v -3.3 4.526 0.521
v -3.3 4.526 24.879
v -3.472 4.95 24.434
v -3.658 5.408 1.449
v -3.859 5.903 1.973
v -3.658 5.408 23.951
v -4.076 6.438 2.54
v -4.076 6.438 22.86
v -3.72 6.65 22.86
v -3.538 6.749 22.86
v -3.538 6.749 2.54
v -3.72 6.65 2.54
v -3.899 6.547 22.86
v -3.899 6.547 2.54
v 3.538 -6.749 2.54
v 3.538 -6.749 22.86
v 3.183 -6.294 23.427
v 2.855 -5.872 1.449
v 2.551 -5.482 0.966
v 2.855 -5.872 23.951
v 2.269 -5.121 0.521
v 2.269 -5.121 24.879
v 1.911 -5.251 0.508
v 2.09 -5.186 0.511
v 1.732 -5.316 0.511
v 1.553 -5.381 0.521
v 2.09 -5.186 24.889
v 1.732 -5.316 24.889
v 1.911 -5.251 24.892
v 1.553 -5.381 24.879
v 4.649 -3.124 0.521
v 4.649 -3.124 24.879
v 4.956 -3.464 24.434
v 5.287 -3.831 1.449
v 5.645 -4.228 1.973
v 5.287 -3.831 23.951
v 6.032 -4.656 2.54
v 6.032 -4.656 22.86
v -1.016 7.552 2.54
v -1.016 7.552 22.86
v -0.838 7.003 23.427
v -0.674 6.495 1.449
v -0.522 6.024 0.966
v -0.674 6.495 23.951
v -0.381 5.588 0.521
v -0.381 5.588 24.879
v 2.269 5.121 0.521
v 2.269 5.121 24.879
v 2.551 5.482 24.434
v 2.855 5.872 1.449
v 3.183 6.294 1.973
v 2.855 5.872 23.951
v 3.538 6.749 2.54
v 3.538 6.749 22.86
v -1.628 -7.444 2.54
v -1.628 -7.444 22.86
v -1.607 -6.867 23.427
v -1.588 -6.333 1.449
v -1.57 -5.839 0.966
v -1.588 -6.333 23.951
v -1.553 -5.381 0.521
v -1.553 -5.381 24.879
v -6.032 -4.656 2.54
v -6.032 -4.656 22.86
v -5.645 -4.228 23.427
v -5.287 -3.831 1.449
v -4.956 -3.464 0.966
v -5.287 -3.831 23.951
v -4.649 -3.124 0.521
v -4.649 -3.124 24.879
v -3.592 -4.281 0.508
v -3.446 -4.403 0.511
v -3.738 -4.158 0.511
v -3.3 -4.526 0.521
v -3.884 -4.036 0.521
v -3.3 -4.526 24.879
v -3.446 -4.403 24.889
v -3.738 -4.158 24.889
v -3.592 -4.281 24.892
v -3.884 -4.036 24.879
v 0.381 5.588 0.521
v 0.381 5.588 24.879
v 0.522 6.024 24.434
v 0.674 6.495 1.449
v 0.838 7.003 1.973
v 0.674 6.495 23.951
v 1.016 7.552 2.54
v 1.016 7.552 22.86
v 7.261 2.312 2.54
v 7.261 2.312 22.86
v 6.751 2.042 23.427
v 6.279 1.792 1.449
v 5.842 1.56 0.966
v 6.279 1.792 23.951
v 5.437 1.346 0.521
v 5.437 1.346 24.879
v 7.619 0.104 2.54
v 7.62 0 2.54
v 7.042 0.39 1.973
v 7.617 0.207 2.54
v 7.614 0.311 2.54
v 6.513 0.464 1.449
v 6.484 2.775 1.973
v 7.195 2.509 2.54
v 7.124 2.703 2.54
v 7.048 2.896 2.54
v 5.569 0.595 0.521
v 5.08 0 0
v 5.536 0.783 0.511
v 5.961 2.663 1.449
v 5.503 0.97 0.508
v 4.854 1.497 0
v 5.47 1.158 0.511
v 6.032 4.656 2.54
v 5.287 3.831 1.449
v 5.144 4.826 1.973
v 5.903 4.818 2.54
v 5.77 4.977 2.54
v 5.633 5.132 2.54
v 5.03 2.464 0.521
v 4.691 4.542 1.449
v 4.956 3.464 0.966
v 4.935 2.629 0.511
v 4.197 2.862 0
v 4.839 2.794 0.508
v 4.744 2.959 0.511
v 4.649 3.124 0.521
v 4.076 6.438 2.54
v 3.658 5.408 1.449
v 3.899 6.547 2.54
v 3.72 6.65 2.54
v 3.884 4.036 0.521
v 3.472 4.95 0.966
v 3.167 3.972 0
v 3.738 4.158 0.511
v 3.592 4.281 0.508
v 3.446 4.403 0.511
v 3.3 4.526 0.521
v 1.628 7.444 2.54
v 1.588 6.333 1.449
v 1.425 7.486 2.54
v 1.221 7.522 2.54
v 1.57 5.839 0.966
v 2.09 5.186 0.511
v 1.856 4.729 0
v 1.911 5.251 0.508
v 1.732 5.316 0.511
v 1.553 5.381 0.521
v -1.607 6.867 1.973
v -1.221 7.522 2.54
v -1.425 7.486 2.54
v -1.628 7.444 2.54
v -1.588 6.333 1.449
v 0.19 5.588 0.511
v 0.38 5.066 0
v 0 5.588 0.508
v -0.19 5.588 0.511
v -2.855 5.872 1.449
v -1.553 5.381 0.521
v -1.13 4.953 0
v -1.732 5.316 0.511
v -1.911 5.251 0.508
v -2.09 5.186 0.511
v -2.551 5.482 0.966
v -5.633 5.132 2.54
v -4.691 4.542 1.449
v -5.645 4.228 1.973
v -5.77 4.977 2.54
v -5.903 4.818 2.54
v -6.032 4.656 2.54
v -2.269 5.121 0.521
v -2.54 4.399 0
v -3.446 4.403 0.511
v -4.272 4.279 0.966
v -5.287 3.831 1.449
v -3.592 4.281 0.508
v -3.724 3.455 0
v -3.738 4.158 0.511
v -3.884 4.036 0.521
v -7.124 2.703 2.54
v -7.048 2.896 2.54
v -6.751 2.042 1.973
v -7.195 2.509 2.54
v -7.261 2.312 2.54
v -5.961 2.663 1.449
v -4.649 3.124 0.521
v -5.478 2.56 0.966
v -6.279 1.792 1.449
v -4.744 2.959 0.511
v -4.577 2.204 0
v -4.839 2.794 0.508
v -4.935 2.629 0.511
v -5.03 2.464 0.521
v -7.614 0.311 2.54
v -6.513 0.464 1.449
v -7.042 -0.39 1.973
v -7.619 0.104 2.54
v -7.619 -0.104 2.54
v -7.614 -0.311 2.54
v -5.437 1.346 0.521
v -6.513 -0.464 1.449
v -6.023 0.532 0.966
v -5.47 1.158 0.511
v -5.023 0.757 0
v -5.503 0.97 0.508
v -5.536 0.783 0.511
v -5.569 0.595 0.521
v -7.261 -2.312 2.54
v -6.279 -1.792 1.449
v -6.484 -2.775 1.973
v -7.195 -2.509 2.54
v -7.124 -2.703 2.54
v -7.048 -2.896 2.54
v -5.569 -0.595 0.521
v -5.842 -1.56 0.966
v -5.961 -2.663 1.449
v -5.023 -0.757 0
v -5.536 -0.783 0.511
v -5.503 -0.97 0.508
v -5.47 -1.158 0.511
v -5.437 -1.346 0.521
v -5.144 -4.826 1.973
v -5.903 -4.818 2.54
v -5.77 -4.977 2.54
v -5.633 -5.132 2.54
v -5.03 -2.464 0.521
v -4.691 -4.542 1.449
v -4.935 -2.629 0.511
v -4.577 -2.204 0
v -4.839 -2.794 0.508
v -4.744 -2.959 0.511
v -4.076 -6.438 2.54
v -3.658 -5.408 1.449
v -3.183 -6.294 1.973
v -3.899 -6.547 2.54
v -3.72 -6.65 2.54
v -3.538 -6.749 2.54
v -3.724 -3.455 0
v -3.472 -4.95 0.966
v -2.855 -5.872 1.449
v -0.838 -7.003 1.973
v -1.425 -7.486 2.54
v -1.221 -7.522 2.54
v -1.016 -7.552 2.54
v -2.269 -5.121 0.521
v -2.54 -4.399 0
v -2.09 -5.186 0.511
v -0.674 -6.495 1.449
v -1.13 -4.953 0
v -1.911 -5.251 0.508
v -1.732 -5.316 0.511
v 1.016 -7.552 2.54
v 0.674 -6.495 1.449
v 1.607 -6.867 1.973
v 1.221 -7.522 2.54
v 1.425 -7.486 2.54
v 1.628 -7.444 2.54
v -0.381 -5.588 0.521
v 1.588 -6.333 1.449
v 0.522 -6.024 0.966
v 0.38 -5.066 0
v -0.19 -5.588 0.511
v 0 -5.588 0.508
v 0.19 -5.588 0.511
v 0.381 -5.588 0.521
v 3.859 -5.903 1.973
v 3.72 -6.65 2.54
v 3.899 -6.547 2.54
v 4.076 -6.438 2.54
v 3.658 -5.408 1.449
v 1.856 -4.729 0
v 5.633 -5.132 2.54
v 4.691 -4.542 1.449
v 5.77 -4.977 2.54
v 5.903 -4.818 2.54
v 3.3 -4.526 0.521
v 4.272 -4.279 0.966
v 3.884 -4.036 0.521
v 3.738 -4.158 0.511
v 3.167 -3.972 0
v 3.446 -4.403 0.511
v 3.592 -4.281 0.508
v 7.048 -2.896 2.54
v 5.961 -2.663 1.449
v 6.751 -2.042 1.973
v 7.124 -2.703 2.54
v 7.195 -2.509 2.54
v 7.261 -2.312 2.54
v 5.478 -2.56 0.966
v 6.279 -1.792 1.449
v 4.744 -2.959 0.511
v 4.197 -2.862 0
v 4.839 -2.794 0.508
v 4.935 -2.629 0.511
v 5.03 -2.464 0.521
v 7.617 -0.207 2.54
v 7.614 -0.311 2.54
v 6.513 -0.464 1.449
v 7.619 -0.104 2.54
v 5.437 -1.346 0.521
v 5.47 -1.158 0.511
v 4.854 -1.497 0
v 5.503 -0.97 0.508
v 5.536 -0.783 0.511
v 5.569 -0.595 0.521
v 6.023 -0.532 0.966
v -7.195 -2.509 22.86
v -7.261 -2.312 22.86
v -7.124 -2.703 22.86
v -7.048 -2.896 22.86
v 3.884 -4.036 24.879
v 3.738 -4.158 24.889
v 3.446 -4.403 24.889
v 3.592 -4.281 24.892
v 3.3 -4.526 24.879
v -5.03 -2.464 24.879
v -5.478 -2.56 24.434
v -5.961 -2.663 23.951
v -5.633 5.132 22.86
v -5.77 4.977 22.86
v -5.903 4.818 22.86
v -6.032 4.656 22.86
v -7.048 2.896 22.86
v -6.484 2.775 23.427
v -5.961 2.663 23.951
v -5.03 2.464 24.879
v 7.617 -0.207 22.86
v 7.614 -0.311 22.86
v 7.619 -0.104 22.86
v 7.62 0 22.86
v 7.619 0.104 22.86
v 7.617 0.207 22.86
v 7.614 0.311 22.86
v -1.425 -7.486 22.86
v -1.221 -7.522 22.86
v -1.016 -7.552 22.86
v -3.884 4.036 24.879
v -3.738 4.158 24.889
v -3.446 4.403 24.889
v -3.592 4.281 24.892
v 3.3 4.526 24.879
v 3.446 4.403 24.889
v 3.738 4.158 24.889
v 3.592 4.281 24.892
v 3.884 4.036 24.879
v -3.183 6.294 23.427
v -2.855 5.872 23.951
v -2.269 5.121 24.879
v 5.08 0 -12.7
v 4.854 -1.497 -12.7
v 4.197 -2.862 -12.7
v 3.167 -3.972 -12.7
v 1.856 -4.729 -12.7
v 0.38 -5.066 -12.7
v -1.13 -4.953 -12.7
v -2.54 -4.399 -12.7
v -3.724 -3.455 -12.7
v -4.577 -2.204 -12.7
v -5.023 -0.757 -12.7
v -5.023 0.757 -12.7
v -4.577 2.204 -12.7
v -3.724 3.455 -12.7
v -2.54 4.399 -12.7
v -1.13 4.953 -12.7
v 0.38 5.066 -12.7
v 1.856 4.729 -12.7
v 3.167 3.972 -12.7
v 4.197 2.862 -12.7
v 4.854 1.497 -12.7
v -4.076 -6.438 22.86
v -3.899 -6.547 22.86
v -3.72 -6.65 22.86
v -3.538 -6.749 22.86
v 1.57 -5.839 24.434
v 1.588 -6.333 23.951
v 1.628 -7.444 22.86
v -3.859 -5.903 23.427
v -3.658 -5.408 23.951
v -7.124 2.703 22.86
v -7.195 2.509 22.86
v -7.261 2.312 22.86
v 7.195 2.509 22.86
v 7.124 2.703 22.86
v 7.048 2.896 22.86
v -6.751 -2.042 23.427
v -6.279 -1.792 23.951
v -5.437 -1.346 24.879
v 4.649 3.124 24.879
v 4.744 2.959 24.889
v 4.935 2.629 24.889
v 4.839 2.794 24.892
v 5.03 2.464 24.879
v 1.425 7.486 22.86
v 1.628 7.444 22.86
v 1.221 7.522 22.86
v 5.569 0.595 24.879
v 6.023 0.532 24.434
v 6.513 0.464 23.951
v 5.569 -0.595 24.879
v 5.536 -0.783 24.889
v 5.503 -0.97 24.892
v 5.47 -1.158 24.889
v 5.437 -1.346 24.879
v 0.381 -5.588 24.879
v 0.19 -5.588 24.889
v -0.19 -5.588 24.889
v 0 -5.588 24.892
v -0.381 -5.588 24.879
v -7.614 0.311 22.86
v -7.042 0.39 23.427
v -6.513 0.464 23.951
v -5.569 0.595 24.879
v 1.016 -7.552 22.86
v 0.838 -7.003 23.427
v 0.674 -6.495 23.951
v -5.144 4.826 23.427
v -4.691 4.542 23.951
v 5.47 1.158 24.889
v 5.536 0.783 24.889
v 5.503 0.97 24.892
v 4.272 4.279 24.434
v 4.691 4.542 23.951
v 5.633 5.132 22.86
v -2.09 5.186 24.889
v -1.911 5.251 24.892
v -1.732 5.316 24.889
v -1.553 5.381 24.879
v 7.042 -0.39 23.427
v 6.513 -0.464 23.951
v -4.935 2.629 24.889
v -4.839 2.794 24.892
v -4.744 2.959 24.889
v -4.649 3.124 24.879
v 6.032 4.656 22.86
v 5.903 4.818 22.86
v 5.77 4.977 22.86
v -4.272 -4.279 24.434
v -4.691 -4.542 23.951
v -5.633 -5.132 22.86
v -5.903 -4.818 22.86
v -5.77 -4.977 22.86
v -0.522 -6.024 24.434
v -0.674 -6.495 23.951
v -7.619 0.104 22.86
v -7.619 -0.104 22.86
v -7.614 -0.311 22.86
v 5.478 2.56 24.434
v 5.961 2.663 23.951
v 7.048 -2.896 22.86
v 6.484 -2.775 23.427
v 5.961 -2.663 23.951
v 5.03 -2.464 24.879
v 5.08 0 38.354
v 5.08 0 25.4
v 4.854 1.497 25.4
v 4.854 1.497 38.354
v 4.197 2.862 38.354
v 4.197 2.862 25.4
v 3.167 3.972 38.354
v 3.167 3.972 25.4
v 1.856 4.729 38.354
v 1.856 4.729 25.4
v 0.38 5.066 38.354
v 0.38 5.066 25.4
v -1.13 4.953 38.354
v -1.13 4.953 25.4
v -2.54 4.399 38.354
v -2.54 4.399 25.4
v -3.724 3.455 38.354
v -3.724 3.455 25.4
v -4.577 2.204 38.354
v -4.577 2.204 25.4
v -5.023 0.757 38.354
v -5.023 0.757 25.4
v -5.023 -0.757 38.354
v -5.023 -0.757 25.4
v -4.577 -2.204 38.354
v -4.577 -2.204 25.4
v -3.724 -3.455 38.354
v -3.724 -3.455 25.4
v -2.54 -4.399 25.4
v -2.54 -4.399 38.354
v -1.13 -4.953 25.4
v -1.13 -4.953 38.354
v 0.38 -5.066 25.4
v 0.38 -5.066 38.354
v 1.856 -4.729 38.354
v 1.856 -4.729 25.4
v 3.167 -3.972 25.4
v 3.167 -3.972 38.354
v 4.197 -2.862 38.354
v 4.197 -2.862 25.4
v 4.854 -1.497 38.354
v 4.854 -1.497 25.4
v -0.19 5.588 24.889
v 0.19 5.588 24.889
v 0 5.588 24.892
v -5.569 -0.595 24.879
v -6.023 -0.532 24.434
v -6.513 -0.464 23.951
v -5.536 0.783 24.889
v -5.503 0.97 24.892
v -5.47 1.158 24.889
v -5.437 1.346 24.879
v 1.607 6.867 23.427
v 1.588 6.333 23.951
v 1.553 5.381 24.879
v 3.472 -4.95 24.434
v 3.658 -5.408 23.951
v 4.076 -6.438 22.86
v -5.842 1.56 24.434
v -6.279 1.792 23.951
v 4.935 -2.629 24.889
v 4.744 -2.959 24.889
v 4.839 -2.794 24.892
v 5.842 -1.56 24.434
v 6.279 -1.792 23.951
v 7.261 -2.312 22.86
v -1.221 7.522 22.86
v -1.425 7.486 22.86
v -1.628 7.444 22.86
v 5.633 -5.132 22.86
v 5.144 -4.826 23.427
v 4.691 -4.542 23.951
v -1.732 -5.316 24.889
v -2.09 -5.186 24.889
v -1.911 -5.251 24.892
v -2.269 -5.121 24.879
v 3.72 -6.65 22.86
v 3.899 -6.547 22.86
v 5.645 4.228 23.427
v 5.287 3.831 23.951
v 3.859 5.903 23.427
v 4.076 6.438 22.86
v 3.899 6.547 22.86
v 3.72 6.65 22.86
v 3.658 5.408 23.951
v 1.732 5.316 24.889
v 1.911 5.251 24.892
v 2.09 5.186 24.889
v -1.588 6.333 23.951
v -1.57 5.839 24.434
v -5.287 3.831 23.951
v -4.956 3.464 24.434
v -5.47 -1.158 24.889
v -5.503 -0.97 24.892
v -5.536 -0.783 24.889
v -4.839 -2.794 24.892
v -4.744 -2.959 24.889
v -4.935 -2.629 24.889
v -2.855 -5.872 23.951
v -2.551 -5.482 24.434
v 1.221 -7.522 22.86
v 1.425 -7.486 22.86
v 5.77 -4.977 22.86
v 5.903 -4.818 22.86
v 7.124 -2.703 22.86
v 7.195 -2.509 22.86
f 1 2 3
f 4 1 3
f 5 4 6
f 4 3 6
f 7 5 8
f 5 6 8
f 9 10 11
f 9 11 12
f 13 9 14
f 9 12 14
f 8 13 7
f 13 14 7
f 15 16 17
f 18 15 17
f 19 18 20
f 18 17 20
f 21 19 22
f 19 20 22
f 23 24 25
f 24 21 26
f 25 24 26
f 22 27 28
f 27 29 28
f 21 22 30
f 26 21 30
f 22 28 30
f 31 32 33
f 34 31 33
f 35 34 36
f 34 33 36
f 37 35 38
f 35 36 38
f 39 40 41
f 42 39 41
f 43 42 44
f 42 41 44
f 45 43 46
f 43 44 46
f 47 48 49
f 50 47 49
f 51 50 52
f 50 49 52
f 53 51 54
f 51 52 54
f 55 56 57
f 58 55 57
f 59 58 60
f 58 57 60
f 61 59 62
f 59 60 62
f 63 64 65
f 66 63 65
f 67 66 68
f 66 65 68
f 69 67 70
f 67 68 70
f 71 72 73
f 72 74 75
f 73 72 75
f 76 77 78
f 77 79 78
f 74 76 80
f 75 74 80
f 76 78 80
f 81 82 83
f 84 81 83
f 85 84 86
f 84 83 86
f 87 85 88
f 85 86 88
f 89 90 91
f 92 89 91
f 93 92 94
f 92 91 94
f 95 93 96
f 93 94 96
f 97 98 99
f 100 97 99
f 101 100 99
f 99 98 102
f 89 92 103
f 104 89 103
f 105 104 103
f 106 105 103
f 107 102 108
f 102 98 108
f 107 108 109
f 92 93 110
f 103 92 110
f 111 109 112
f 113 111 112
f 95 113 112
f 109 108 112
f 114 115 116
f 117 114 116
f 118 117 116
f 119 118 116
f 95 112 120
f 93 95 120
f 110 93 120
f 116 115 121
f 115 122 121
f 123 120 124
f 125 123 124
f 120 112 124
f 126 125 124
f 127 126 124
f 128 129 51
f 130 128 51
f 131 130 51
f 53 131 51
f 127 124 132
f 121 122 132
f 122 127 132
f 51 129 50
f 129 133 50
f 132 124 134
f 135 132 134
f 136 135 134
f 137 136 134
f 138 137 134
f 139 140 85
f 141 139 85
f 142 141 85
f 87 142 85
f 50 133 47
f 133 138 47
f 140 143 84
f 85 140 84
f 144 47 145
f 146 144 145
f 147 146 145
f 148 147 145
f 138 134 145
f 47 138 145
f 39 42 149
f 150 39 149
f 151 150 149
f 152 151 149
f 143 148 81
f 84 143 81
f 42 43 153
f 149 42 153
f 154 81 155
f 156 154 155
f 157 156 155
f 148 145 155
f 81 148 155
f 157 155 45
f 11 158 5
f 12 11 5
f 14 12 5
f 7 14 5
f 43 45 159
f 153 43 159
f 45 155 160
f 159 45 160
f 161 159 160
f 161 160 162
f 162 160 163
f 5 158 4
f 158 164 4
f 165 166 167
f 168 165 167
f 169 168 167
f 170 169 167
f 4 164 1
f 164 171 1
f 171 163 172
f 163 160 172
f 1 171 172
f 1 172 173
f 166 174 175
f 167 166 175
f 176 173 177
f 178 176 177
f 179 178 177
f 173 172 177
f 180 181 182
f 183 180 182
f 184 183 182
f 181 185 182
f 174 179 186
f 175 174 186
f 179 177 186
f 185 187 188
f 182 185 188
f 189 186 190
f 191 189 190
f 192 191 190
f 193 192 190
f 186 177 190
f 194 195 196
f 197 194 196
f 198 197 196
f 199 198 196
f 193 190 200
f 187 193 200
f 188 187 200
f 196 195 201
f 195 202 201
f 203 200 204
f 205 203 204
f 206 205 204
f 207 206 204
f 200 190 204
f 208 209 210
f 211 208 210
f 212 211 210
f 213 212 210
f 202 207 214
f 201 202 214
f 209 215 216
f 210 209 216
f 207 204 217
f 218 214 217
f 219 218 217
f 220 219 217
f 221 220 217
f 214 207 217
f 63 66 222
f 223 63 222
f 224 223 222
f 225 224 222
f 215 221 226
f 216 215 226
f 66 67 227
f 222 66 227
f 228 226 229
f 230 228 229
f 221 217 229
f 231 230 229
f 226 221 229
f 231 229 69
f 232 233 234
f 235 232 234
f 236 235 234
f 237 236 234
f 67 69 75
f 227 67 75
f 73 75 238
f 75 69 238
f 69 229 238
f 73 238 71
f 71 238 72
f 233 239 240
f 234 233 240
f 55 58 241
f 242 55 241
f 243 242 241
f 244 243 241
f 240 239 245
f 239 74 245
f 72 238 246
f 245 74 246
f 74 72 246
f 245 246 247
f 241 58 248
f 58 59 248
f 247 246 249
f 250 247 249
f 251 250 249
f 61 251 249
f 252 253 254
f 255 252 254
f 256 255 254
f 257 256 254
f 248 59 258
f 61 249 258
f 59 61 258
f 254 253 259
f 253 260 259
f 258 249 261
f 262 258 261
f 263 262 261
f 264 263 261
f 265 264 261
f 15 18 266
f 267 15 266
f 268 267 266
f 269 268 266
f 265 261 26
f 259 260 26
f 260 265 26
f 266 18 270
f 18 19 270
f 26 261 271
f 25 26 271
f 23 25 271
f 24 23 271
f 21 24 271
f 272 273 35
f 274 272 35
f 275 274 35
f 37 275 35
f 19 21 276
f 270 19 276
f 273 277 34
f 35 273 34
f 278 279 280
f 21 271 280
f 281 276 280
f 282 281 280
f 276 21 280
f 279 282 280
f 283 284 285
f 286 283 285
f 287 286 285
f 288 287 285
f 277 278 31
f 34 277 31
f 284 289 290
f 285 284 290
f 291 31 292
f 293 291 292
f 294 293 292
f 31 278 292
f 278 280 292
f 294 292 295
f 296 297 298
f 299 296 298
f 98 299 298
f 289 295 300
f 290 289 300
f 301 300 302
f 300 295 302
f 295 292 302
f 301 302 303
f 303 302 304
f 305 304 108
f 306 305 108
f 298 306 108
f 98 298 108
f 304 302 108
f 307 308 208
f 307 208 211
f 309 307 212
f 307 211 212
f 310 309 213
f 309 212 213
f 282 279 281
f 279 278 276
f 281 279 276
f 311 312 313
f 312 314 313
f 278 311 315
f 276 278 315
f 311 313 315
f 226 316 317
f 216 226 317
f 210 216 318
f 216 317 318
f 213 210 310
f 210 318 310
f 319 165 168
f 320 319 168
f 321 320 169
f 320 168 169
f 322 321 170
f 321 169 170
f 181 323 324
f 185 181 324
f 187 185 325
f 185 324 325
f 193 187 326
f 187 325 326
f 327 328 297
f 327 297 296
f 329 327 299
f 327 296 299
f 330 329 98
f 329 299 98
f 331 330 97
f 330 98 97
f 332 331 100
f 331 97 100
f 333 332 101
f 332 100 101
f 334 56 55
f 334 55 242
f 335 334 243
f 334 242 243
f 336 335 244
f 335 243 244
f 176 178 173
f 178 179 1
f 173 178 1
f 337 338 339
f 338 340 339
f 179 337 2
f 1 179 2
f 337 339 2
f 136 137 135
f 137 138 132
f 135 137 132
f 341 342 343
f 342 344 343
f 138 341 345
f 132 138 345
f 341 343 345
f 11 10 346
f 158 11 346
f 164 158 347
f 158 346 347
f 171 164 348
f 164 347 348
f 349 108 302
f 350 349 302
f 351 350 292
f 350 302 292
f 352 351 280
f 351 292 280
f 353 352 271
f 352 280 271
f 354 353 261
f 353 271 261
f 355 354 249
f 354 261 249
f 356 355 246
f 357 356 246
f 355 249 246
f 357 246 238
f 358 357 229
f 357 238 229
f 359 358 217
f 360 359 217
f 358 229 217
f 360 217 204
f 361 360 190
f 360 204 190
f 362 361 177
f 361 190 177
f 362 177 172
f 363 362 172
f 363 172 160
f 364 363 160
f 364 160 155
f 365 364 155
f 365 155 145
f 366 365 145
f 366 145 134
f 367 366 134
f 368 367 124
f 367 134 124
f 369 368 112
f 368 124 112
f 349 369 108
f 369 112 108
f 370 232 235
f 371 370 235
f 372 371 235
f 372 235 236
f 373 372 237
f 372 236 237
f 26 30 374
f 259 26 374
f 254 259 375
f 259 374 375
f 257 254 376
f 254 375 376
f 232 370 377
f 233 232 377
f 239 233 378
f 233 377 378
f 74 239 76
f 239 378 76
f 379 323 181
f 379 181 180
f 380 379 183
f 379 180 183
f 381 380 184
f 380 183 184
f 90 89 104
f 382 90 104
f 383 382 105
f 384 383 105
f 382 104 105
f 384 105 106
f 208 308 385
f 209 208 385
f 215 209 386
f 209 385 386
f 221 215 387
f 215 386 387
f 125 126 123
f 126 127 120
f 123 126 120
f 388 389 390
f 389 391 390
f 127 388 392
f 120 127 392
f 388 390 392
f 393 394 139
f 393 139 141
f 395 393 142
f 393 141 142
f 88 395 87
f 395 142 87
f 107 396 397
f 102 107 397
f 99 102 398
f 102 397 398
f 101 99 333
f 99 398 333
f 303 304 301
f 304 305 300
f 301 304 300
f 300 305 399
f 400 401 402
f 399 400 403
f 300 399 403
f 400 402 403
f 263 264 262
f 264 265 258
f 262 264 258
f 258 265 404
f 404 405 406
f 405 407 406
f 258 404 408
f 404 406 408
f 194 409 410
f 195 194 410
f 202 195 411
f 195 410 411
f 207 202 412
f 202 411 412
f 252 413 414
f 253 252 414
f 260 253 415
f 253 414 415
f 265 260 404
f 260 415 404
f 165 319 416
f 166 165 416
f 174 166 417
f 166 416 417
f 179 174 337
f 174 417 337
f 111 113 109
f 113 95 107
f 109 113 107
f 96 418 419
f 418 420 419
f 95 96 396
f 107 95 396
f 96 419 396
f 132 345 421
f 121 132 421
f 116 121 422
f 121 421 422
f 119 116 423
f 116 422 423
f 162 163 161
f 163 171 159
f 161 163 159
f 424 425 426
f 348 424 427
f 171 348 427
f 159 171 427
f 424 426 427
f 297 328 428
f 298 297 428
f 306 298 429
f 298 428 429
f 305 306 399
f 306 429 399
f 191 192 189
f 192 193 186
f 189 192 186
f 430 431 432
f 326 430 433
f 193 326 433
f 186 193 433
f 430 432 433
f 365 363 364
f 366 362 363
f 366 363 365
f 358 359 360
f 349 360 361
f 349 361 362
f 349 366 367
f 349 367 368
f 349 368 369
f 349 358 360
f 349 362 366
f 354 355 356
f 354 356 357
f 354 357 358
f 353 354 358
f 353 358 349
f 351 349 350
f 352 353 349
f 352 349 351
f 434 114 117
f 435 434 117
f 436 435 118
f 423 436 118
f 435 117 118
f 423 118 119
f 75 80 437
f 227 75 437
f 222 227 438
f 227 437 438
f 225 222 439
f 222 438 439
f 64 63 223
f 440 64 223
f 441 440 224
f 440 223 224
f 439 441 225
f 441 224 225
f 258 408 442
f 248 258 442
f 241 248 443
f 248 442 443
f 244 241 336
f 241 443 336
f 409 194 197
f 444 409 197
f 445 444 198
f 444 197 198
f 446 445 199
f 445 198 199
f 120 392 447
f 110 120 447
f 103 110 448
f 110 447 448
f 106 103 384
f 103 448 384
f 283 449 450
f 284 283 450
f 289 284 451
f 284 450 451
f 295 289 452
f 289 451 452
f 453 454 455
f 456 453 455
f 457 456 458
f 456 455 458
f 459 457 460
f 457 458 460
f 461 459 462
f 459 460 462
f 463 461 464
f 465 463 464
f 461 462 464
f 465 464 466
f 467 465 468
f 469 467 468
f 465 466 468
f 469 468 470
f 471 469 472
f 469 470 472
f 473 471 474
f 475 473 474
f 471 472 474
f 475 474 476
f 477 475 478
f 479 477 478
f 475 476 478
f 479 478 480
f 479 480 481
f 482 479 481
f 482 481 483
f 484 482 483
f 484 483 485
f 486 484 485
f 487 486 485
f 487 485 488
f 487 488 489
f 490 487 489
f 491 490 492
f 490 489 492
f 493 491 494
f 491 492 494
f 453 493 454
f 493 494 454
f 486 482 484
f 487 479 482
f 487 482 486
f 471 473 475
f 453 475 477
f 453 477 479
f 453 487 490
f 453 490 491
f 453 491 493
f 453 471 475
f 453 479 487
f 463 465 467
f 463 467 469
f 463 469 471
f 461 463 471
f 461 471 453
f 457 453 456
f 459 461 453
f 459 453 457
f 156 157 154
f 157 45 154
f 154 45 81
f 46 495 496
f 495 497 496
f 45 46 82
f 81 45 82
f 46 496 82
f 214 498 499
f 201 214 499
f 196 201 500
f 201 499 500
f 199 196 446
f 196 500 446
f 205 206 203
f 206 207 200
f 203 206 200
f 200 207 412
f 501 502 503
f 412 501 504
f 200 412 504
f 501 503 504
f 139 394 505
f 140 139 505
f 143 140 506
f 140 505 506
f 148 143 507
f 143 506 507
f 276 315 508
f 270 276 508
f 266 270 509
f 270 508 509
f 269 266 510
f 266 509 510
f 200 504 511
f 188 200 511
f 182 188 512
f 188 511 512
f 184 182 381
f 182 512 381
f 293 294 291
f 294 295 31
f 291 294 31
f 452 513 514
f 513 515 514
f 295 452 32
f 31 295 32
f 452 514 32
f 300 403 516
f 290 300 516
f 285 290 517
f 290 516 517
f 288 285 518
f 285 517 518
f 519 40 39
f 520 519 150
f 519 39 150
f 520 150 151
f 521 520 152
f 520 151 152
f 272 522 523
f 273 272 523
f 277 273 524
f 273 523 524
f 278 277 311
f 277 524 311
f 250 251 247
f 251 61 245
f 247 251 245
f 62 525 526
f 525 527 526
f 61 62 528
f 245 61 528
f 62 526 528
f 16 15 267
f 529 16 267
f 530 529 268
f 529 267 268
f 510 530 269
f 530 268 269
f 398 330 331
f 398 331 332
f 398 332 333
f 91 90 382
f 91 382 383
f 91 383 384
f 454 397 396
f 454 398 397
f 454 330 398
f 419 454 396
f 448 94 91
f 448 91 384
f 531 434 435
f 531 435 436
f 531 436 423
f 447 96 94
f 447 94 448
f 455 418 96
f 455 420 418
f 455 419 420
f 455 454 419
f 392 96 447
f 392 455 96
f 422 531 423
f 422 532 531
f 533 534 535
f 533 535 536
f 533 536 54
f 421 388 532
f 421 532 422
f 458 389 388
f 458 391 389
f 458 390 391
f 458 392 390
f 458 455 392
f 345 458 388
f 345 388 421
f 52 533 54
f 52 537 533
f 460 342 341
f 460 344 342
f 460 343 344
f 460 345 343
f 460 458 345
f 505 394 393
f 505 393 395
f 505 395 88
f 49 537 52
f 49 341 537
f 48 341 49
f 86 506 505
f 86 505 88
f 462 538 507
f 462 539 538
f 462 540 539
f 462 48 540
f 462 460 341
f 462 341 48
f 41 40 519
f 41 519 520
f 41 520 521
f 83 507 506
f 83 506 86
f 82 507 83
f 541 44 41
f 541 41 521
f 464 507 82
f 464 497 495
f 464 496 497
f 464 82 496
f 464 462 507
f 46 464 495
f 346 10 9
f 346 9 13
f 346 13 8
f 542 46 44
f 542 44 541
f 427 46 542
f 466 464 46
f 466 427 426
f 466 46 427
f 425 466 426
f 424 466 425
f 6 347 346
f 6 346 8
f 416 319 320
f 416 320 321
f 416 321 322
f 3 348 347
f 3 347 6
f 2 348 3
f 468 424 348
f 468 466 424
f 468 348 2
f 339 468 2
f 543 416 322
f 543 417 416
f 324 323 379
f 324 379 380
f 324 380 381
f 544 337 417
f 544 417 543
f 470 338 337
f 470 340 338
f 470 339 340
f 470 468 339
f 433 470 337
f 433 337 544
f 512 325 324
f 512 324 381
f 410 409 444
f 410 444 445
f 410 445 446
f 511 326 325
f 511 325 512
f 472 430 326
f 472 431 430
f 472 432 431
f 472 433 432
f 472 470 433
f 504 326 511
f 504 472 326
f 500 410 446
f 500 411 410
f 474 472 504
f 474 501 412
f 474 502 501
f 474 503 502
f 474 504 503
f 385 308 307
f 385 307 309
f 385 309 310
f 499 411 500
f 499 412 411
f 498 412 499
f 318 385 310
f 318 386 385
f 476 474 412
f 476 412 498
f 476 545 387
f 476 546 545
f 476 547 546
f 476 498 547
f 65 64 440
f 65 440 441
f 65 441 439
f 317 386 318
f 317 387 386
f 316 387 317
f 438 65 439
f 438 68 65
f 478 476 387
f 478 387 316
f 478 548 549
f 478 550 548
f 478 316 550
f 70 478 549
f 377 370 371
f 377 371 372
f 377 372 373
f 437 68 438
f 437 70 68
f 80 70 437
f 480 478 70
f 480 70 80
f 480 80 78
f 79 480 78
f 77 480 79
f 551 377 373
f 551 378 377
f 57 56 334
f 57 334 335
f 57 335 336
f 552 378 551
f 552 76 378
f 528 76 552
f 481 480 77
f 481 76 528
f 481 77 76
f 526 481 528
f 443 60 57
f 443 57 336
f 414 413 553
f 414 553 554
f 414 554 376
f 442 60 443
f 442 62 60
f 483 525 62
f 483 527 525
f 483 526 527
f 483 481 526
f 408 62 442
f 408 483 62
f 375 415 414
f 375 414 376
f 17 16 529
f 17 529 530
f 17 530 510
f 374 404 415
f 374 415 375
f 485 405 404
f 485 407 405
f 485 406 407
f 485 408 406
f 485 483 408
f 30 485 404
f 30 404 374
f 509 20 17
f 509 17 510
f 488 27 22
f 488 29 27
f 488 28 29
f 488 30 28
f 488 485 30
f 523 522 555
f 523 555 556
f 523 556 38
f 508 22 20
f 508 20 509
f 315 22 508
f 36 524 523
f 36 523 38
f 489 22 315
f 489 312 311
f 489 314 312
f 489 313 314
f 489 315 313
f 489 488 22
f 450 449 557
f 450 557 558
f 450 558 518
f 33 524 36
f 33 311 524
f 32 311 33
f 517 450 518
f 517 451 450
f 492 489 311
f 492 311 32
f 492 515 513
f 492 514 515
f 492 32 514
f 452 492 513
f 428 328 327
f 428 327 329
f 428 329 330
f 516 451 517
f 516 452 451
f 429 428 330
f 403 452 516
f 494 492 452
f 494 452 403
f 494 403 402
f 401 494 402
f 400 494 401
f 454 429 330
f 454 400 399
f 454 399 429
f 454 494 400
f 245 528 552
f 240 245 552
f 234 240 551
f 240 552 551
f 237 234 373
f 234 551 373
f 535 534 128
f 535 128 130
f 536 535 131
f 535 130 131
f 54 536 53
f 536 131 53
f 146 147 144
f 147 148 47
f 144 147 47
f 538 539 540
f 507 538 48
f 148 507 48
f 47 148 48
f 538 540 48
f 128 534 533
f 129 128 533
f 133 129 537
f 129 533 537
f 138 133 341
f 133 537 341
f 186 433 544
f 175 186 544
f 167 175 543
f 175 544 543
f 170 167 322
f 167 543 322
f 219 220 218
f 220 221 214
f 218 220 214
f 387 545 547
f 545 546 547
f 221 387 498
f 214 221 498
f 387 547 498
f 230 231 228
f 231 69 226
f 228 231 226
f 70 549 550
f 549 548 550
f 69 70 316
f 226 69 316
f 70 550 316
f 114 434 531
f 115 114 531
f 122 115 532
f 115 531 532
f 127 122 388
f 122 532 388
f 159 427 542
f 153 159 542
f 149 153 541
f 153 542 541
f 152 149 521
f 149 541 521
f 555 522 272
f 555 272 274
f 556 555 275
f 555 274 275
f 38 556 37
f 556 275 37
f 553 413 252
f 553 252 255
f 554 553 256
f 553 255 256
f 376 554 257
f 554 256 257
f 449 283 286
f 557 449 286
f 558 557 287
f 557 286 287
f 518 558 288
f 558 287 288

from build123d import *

# Parameters (mm, degrees)
F0_R            = 7.62
F1_DEPTH        = 25.4
F2_SIZE         = 2.54
F4_DEPTH        = 25.4
F4_COPIES_COUNT = 18
F6_R            = 5.08
F7_DEPTH        = 12.954
F8_R            = 5.08
F9_DEPTH        = 12.7


# Not quite as in the source:
# - a pattern or mirror of a feature is missing from the dataset's text; its kind, count and spacing are read off the source's solid


with BuildPart() as f1:
    # F0 (on Top) → F1 (new body)
    with BuildSketch(Plane.XY):
        Circle(F0_R)
    extrude(amount=F1_DEPTH)

    # F2
    f2_edges = [f1.edges().sort_by_distance(p)[0] for p in [
        (-7.62, 0, 25.4),
        (-7.62, 0, 0),
    ]]
    chamfer(f2_edges, length=F2_SIZE)

    # F3 (on face) → F4 (cut, through all)
    with BuildSketch(Plane.XY.offset(25.4)):
        with BuildLine():
            ThreePointArc((1.016, 7.5519629236), (0, 7.62), (-1.016, 7.5519629236))
            Line((-1.016, 7.5519629236), (-0.381, 5.588))
            Line((-0.381, 5.588), (0.381, 5.588))
            Line((0.381, 5.588), (1.016, 7.5519629236))
        make_face()
    f4 = extrude(amount=-F4_DEPTH, mode=Mode.SUBTRACT)

    # F4_copies: F4 ×18 about axis
    f4_copies_axis = Axis((0, 0, 0), (0, 0, 1))
    for i in range(1, F4_COPIES_COUNT):
        add(f4.rotate(f4_copies_axis, i * 360 / F4_COPIES_COUNT), mode=Mode.SUBTRACT)

    # F6 (on face) → F7 (join)
    with BuildSketch(Plane.XY.offset(25.4)):
        Circle(F6_R)
    extrude(amount=F7_DEPTH)

    # F8 (on face) → F9 (join)
    with BuildSketch(Plane(origin=(0, 0, 0), x_dir=(1, 0, 0), z_dir=(0, 0, -1))):
        Circle(F8_R)
    extrude(amount=F9_DEPTH)


solid = f1.part
